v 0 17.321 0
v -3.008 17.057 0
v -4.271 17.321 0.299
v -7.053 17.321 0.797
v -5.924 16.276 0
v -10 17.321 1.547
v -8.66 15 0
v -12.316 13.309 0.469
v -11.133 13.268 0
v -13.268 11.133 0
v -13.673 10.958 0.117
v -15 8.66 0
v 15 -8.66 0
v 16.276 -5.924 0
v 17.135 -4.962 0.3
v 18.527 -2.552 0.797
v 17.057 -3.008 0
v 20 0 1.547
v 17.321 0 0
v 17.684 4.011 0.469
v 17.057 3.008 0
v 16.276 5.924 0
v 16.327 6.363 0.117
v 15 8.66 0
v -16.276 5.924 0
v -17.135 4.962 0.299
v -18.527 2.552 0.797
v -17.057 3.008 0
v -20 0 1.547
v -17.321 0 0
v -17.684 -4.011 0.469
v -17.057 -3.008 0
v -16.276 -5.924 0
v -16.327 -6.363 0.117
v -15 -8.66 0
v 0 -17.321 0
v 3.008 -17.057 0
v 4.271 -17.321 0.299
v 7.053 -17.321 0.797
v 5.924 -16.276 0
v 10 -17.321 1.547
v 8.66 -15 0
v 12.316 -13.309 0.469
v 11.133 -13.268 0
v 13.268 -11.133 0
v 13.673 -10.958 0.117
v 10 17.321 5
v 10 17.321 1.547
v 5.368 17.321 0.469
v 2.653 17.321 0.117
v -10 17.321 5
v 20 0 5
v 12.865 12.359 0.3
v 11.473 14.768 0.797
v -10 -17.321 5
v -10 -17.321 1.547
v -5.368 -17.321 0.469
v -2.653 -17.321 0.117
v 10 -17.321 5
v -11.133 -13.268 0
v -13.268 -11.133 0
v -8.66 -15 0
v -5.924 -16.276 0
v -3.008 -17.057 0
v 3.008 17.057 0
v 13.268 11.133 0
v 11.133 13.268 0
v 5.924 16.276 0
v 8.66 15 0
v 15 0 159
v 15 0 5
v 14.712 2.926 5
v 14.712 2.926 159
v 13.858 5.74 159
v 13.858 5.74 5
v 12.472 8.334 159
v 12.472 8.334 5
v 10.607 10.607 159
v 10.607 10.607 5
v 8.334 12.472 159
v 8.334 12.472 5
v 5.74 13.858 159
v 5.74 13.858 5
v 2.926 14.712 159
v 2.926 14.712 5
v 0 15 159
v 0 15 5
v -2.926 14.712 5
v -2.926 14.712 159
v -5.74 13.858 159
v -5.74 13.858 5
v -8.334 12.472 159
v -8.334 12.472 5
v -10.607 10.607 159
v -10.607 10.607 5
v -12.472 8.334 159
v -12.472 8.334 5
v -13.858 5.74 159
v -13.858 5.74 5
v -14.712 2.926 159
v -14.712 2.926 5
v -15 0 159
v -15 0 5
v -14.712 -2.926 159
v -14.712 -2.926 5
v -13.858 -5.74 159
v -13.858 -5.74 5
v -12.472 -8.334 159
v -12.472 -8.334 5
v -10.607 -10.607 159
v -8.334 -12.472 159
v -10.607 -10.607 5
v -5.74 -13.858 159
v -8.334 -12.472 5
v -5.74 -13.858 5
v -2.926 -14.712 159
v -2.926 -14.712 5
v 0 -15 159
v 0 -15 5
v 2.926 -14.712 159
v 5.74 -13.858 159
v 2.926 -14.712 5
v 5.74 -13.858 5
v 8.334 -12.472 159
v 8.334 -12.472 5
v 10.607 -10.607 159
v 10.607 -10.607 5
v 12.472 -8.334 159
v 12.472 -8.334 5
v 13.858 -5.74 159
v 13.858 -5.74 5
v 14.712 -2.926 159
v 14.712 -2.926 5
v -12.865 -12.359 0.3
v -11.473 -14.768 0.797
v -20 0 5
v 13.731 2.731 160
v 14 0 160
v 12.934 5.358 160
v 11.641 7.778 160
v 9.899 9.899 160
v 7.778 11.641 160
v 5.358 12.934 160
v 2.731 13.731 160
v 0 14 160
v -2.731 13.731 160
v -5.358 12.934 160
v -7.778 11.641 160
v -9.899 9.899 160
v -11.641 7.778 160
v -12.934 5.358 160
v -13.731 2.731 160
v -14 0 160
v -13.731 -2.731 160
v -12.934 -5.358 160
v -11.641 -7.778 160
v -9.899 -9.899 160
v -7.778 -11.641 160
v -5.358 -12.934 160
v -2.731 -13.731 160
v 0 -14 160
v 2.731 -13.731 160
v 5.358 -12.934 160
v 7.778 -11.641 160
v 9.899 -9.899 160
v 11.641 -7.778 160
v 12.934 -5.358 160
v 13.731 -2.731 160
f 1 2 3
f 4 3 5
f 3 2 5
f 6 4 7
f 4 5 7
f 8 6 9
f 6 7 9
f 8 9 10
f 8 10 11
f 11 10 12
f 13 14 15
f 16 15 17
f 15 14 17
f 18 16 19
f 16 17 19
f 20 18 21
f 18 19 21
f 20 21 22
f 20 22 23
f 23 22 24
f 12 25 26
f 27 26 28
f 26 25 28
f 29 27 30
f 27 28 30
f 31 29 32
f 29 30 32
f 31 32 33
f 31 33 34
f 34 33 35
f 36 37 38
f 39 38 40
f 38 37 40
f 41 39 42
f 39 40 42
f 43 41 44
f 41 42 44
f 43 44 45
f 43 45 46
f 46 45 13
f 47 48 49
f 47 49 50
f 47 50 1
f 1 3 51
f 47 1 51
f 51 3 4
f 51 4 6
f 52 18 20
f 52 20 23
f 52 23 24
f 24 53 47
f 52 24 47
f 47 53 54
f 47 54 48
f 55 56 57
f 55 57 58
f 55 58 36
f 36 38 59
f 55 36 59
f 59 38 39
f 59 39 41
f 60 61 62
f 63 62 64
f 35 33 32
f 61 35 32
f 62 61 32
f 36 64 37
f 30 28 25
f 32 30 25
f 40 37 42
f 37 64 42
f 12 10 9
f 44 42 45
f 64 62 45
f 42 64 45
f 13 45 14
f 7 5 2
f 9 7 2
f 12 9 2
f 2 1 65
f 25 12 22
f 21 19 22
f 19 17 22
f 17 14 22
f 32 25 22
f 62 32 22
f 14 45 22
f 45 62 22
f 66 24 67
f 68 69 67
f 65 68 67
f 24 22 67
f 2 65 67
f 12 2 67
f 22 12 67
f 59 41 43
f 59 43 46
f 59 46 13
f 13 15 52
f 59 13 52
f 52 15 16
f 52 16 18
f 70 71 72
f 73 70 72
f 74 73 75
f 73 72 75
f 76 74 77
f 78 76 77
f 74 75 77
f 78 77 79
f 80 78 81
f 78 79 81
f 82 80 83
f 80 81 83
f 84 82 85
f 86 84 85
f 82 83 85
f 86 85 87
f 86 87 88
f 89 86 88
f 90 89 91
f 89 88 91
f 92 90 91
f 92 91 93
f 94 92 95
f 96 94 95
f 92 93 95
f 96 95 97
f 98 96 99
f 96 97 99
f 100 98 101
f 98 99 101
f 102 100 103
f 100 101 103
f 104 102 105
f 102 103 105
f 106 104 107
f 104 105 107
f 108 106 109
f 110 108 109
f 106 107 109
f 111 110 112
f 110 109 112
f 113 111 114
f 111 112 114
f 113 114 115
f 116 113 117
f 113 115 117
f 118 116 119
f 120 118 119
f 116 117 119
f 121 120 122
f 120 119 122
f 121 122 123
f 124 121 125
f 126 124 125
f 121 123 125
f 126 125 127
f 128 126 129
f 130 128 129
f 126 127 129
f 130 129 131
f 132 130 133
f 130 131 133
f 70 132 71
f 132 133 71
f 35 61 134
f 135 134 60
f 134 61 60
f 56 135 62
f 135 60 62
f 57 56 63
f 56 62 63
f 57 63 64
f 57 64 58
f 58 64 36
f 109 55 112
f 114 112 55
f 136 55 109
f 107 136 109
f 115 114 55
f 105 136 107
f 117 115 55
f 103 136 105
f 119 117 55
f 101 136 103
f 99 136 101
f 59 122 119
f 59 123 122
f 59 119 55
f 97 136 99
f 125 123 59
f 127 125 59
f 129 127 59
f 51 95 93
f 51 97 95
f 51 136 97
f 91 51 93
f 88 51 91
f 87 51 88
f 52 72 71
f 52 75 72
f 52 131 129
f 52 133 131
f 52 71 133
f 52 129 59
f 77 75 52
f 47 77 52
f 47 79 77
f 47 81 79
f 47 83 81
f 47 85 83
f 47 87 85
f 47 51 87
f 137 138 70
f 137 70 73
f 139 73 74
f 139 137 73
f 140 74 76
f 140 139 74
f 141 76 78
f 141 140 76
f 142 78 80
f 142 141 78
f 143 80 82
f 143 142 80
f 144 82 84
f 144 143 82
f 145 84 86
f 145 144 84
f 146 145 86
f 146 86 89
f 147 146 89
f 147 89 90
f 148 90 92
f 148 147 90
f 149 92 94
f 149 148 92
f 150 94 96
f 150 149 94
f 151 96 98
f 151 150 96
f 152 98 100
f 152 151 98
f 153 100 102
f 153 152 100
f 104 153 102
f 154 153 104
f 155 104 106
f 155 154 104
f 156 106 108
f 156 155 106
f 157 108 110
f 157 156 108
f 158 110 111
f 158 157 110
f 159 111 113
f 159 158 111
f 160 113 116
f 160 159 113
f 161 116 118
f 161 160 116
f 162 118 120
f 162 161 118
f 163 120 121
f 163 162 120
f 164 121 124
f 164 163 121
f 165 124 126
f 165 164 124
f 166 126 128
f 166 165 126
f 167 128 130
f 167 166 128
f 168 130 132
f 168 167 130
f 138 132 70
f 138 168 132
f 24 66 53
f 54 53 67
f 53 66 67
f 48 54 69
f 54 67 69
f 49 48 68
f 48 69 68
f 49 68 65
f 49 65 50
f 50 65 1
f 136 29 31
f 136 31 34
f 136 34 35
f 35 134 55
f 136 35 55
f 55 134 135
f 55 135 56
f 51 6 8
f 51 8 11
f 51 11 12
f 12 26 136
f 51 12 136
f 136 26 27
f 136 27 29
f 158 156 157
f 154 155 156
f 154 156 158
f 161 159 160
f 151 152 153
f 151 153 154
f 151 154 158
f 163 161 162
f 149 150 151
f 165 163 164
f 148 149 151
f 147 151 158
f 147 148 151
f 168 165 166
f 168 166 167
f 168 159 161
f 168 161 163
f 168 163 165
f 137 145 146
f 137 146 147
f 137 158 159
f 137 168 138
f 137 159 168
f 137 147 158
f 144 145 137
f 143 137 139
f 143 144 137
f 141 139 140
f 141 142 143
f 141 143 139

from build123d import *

# Parameters (mm, degrees)
DODANIE_WYCI_GNI_CIE1_DEPTH = 5
SZKIC2_OUTSIDE_W            = 69.95
SZKIC2_OUTSIDE_H            = 64.592
SZKIC2_OUTSIDE_R            = 17.320508076
WYTNIJ_WYCI_GNI_CIE1_DEPTH  = 5
WYTNIJ_WYCI_GNI_CIE1_DRAFT  = 60
SZKIC3_R                    = 15
DODANIE_WYCI_GNI_CIE2_DEPTH = 155
SFAZOWANIE1_SIZE            = 1


with BuildPart() as part:
    # Szkic1 → Dodanie-wyciągnięcie1 (new body)
    with BuildSketch(Plane.XY):
        Polygon((10, 17.320508076), (-10, 17.320508076), (-20, 0), (-10, -17.320508076), (10, -17.320508076), (20, 0), align=None)
    extrude(amount=DODANIE_WYCI_GNI_CIE1_DEPTH)


with BuildPart() as wytnij_wyci_gni_cie1_tool:
    # Szkic2 outside → Wytnij-wyciągnięcie1 (with draft: the straight prism first)
    with BuildSketch(Plane.XY):
        Rectangle(SZKIC2_OUTSIDE_W, SZKIC2_OUTSIDE_H)
        Circle(SZKIC2_OUTSIDE_R, mode=Mode.SUBTRACT)
    extrude(amount=WYTNIJ_WYCI_GNI_CIE1_DEPTH)
    # Wytnij-wyciągnięcie1: the draft: its side faces are tilted about the plane it starts from
    wytnij_wyci_gni_cie1_sides = [wytnij_wyci_gni_cie1_tool.faces().sort_by_distance(p)[0] for p in [
        (0, -32.296, 2.5),
        (34.975, 0, 2.5),
        (0, 32.296, 2.5),
        (-34.975, 0, 2.5),
        (-17.320508076, 0, 2.5),
    ]]
    draft(wytnij_wyci_gni_cie1_sides, Plane.XY, WYTNIJ_WYCI_GNI_CIE1_DRAFT)


with BuildPart() as part_1:
    add(part.part)

    # Wytnij-wyciągnięcie1: cut by wytnij_wyci_gni_cie1_tool
    add(wytnij_wyci_gni_cie1_tool.part, mode=Mode.SUBTRACT)

    # Szkic3 → Dodanie-wyciągnięcie2 (add)
    with BuildSketch(Plane.XY.offset(5)):
        Circle(SZKIC3_R)
    extrude(amount=DODANIE_WYCI_GNI_CIE2_DEPTH)

    # Sfazowanie1
    sfazowanie1_edges = [part_1.edges().sort_by_distance(p)[0] for p in [
        (-15, 0, 160),
    ]]
    chamfer(sfazowanie1_edges, length=SFAZOWANIE1_SIZE)


solid = part_1.part
